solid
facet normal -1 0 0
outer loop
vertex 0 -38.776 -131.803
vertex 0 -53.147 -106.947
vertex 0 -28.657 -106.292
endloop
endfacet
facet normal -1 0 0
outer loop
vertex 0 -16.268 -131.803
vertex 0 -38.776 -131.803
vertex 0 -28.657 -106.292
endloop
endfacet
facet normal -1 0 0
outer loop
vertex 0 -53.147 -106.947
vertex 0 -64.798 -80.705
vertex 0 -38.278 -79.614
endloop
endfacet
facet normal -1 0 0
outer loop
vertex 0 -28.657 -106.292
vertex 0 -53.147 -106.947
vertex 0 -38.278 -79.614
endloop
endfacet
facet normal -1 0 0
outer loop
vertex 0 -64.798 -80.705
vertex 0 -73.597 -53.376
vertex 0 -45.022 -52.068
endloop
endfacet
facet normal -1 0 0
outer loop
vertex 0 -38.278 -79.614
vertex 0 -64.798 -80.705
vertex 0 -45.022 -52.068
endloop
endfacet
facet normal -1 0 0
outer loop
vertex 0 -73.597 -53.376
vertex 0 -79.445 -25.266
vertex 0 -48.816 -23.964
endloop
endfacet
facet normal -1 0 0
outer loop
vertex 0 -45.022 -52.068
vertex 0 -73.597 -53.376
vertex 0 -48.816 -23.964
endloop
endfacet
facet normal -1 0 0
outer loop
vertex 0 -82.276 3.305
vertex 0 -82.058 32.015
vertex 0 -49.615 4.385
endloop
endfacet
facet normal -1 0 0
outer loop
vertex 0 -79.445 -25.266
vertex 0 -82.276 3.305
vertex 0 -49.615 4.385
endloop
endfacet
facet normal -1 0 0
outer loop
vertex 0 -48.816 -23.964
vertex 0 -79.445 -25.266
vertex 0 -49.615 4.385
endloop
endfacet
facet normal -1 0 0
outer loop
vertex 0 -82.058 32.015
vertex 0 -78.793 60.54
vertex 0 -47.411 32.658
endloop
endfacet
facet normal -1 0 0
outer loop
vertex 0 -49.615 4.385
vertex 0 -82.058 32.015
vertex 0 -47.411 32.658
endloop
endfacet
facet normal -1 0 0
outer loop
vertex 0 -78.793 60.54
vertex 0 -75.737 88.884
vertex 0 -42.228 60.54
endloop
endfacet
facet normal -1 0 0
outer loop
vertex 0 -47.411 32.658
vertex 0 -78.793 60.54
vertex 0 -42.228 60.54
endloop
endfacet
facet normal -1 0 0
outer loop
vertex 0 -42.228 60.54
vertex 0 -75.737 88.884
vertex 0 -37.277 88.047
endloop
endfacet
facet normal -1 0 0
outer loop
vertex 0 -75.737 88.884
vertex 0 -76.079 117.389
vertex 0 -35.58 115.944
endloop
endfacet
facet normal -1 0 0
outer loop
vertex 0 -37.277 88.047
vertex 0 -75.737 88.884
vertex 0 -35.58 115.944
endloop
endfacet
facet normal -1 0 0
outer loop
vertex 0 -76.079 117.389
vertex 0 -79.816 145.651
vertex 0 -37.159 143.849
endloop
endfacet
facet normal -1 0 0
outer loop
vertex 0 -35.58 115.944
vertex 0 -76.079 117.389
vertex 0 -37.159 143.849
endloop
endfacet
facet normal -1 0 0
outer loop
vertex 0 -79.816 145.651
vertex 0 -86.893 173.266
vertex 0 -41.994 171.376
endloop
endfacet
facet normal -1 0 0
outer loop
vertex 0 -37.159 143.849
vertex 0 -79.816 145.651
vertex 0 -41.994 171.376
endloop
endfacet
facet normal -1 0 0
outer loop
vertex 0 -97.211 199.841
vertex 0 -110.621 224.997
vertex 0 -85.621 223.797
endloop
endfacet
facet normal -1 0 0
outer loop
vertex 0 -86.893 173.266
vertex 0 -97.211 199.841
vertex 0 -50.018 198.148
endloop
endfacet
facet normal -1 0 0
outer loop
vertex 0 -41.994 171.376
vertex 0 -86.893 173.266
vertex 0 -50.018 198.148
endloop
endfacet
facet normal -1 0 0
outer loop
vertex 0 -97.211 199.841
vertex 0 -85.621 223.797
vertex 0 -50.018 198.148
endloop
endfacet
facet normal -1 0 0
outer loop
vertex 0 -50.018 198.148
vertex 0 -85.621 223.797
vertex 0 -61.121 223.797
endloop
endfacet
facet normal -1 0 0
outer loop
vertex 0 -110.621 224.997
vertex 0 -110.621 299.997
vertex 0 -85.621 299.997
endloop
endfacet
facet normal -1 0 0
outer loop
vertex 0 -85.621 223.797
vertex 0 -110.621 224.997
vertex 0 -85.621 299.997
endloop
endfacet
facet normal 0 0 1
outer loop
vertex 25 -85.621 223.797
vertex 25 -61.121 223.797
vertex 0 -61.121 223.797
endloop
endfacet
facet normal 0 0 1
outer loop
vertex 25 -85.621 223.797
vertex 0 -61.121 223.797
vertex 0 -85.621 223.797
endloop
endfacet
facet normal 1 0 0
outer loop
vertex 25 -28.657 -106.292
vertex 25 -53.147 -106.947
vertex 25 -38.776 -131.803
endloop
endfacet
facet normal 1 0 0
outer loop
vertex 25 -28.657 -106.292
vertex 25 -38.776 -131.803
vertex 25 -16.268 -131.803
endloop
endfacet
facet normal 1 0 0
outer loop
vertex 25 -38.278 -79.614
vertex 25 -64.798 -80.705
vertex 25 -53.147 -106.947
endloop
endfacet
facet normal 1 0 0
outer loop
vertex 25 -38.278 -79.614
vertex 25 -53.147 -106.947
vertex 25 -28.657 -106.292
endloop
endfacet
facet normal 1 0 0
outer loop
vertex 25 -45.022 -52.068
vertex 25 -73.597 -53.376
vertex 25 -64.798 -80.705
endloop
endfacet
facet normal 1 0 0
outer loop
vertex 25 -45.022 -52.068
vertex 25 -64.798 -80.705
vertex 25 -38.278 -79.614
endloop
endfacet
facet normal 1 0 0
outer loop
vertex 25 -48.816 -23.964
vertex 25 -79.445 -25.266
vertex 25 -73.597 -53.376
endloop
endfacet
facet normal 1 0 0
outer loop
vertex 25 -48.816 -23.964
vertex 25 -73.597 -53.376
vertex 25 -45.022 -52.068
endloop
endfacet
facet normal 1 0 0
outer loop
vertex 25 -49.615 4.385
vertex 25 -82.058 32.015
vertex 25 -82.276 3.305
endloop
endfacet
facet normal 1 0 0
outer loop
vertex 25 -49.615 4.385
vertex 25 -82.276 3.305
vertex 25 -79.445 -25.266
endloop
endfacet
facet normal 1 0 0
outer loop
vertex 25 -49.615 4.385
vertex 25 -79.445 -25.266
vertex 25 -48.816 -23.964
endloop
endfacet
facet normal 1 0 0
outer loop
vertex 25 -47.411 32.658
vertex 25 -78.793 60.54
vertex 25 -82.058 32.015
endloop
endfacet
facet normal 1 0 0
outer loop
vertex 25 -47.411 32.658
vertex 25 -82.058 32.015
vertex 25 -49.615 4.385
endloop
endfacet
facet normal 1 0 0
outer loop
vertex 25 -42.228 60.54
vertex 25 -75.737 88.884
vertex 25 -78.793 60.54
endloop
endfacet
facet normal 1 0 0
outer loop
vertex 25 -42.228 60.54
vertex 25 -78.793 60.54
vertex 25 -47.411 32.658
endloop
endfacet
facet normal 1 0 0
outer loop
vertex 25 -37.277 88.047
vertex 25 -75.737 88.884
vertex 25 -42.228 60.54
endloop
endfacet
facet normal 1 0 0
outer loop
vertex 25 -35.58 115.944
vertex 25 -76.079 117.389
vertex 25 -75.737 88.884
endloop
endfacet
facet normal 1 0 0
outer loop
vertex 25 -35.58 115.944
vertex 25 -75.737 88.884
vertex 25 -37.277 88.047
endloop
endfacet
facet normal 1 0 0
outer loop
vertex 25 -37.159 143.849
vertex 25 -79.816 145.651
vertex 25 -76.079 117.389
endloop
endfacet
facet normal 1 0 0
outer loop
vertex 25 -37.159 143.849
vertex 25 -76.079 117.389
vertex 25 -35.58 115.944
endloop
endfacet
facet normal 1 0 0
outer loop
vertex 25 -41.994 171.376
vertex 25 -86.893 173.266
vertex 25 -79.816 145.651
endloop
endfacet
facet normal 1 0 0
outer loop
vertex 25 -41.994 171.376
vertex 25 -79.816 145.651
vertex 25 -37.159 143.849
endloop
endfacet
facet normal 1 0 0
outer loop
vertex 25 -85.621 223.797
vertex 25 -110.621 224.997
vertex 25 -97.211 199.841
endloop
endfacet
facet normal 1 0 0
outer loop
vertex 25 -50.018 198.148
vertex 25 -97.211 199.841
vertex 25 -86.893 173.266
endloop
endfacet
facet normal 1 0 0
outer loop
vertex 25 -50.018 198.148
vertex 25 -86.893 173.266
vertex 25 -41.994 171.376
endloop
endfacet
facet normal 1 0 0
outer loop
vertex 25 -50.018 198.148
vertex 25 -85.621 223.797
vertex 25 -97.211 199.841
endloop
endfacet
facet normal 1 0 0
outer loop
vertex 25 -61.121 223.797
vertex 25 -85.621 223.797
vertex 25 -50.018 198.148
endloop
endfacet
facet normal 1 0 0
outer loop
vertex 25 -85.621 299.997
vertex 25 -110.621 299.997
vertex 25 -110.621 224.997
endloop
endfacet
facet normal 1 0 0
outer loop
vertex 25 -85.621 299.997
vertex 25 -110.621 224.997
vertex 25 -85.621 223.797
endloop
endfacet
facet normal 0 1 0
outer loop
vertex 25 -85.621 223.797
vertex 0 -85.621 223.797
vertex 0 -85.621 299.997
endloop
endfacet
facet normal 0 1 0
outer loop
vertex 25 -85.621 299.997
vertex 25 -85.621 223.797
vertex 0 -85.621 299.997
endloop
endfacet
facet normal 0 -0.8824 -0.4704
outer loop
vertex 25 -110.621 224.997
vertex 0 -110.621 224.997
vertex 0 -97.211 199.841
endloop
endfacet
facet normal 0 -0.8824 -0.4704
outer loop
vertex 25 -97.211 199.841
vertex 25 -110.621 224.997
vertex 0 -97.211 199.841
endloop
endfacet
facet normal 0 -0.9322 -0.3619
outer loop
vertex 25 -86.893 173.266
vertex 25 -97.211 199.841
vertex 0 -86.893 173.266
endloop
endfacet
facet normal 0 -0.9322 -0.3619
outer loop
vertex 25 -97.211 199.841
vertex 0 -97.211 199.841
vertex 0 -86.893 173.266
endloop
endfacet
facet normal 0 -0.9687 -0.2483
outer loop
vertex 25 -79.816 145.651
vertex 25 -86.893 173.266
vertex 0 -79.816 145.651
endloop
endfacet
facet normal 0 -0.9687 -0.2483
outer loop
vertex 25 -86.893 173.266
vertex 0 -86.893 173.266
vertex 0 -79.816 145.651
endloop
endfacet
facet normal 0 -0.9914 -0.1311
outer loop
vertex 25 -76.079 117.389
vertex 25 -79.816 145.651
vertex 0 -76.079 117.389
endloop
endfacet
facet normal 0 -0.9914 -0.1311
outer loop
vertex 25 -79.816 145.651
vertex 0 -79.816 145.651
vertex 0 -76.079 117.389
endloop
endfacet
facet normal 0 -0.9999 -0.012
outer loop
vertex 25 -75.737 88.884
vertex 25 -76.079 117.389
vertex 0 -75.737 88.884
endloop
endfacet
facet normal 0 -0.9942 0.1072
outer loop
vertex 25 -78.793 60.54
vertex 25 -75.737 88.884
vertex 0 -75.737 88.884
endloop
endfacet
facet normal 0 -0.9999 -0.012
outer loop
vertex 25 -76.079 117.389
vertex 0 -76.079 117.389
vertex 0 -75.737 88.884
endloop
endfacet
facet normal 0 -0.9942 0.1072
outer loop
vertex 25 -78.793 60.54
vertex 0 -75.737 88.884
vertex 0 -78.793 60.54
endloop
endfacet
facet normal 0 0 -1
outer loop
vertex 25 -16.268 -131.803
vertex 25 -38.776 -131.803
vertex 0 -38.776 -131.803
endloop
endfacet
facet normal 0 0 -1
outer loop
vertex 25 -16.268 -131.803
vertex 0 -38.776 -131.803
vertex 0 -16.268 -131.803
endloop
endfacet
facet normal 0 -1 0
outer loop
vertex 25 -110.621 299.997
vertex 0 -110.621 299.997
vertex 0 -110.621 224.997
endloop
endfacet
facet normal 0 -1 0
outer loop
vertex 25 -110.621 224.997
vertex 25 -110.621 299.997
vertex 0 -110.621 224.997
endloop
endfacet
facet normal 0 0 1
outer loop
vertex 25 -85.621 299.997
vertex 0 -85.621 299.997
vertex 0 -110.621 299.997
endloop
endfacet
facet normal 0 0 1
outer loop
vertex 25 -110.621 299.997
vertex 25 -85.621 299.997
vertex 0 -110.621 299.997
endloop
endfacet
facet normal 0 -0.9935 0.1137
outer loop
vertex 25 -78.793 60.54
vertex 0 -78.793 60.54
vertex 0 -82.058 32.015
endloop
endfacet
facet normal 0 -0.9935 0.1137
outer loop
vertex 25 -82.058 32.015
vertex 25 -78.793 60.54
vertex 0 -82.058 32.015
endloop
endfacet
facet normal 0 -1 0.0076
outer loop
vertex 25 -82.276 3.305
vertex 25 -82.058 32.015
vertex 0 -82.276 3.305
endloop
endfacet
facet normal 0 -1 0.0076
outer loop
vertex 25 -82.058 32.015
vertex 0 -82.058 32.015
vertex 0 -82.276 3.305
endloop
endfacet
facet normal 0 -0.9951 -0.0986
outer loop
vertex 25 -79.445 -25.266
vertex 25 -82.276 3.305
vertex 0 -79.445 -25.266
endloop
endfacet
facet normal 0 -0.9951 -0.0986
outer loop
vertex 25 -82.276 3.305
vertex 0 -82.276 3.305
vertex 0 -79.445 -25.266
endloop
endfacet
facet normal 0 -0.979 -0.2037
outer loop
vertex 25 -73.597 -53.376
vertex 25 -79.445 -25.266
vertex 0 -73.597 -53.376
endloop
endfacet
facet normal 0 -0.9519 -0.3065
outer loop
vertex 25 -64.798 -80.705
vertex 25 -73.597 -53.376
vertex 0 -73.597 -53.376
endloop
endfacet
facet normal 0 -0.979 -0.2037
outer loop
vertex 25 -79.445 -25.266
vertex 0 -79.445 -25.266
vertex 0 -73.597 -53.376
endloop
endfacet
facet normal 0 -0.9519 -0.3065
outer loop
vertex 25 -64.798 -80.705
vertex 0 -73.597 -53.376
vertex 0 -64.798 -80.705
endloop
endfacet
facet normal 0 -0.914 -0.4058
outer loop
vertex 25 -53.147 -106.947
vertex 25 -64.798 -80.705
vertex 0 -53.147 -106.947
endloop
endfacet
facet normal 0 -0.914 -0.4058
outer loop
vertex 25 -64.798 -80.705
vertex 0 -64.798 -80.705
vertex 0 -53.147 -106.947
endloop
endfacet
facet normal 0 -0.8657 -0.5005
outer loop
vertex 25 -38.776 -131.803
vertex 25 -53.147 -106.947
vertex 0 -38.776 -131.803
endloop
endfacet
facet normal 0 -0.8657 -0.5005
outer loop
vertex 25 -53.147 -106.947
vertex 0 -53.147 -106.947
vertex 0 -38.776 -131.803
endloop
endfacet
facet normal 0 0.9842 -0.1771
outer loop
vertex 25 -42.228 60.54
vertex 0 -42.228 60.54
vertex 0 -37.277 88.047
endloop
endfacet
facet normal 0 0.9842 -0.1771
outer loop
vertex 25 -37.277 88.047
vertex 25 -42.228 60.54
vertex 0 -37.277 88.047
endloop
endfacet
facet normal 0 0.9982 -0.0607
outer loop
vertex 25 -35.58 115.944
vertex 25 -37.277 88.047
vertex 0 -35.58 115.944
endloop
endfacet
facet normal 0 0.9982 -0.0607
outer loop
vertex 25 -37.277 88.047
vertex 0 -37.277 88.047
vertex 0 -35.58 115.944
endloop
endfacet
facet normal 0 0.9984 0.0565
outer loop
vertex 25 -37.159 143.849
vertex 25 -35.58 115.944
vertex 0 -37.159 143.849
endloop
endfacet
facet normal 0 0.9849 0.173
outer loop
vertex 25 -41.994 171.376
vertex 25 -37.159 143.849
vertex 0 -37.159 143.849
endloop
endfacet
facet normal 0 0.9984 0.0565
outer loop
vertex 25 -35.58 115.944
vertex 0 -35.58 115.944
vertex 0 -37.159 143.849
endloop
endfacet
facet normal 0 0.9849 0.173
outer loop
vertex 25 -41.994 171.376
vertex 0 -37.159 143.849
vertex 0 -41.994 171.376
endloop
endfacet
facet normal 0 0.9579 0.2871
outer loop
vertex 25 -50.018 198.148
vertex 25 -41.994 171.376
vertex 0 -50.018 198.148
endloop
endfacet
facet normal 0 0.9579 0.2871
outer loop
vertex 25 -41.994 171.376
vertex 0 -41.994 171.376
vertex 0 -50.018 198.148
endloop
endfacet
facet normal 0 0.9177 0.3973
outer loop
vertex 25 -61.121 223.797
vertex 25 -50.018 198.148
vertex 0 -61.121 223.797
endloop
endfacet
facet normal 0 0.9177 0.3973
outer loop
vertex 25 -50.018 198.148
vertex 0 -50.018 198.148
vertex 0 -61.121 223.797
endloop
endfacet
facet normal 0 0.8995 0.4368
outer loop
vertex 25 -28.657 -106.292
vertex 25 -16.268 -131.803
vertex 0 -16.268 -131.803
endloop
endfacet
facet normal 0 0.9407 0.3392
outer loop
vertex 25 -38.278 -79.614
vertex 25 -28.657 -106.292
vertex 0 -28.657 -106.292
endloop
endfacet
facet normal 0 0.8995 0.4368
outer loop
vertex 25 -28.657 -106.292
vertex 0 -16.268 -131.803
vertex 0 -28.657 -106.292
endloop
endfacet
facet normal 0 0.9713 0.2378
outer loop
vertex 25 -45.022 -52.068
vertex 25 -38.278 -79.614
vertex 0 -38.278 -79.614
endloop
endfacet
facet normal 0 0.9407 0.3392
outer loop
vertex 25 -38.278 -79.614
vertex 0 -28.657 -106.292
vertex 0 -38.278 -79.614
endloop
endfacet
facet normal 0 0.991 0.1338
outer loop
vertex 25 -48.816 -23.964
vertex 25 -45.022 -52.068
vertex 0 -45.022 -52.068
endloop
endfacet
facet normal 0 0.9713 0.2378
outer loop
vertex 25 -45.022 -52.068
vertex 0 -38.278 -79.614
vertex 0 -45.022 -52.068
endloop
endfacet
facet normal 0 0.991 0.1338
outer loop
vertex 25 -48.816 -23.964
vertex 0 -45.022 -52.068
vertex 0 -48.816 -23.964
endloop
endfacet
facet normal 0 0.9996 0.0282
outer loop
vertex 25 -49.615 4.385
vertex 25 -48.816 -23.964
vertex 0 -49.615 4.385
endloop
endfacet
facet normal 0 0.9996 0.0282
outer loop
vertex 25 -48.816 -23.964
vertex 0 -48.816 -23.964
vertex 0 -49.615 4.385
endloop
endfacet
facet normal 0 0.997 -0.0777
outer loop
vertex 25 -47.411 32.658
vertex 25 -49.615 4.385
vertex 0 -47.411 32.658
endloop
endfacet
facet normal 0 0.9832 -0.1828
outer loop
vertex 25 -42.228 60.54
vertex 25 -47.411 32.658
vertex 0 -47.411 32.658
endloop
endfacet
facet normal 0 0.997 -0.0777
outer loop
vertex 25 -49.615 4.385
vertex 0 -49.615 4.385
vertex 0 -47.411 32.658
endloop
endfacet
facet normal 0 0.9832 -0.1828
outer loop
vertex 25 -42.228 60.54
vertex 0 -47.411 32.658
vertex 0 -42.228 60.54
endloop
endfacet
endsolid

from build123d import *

# Parameters (mm, degrees)
F1_DEPTH = 25


with BuildPart() as f1:
    # F0 (on Right) → F1 (new body)
    with BuildSketch(Plane.YZ):
        with BuildLine():
            ThreePointArc((-42.22845, 60.540393), (-37.159315, 143.848694), (-61.121118, 223.797434))
            Line((-61.121118, 223.797434), (-85.621118, 223.797434))
            Line((-85.621118, 223.797434), (-85.621118, 299.997434))
            Line((-85.621118, 299.997434), (-110.621118, 299.997434))
            Line((-110.621118, 299.997434), (-110.621118, 224.997434))
            ThreePointArc((-110.621118, 224.997434), (-79.816037, 145.650842), (-78.79324, 60.540393))
            ThreePointArc((-78.79324, 60.540393), (-76.894776, -39.398884), (-38.776239, -131.802566))
            Line((-38.776239, -131.802566), (-16.268492, -131.802566))
            ThreePointArc((-16.268492, -131.802566), (-47.291443, -38.066293), (-42.22845, 60.540393))
        make_face()
    extrude(amount=F1_DEPTH)


solid = f1.part
